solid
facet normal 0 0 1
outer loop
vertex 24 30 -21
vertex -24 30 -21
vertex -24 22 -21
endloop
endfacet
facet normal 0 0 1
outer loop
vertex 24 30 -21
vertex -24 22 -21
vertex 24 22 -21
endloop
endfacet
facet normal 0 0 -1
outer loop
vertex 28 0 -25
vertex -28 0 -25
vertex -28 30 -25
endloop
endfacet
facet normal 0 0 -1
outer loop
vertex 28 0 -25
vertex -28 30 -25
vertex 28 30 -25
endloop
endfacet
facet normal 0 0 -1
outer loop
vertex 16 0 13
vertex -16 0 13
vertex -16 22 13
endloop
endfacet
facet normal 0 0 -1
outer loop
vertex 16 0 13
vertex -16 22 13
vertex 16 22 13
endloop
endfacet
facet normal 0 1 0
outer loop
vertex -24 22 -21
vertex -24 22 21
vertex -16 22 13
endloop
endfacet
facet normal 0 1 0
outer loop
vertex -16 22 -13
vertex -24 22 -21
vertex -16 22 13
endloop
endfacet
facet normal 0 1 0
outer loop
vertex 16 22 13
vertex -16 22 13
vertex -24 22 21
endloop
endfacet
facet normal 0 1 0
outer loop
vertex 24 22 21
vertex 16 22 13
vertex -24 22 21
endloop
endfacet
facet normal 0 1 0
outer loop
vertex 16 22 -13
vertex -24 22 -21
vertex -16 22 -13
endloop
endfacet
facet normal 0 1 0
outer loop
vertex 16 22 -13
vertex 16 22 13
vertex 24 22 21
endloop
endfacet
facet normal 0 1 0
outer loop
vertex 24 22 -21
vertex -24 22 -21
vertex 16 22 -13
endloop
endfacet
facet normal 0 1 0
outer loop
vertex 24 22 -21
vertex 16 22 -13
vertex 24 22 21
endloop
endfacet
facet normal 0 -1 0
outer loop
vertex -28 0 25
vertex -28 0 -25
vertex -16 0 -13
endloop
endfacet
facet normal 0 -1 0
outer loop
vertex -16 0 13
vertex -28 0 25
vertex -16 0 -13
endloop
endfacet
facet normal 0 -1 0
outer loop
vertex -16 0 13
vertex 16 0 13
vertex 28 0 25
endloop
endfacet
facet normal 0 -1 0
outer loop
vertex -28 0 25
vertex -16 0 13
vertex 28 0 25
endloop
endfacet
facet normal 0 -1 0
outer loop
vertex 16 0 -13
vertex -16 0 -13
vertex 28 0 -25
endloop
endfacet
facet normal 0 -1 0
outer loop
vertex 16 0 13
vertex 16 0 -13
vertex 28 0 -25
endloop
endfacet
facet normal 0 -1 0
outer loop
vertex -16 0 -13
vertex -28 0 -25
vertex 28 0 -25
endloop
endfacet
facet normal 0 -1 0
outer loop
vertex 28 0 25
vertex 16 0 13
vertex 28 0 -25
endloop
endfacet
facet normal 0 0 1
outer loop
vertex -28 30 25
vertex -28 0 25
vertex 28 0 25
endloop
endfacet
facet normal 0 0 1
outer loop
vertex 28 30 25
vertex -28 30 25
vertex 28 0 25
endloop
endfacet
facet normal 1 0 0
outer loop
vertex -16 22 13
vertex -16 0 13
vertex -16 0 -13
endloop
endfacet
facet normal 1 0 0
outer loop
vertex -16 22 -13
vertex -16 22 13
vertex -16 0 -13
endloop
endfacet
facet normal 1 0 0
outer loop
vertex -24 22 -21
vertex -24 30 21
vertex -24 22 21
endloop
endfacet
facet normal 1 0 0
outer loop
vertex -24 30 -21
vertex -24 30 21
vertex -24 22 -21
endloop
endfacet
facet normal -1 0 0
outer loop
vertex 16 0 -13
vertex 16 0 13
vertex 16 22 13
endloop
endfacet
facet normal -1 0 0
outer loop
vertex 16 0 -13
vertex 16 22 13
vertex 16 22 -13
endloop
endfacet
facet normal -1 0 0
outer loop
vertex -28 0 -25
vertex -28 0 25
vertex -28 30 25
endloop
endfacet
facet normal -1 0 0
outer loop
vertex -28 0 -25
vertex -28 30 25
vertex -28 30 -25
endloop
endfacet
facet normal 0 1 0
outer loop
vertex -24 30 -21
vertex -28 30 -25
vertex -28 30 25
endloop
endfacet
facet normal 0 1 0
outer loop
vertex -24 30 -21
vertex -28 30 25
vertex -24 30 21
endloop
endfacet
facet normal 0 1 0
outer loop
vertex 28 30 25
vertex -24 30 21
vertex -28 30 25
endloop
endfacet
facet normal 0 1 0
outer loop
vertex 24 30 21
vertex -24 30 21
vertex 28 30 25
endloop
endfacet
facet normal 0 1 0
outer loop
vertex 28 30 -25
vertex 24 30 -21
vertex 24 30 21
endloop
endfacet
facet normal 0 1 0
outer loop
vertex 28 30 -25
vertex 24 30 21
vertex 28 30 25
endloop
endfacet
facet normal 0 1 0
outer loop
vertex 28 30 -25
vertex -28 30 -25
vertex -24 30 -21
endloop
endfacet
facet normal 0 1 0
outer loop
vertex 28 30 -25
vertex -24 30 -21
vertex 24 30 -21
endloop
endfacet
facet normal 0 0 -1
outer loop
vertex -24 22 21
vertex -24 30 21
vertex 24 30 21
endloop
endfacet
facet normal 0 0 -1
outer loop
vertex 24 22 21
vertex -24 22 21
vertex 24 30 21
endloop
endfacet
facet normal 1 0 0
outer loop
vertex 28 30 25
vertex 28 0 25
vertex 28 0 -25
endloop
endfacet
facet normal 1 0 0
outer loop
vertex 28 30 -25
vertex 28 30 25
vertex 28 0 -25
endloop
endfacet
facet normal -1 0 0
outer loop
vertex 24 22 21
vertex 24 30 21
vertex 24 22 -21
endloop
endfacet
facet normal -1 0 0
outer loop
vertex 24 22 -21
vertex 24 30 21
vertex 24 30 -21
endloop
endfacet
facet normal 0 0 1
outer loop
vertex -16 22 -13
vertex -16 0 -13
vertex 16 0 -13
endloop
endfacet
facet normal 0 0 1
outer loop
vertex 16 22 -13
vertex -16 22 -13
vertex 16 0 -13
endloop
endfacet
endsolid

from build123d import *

# Parameters (mm, degrees)
SKETCH1_W               = 56
SKETCH1_H               = 50
BOSS_EXTRUDE1_DEPTH     = 30
SKETCH3_W               = 48
SKETCH3_H               = 42
CUT_EXTRUDE1_DEPTH      = 8
CUT_EXTRUDE2_DEPTH      = 44.508619836
CUT_EXTRUDE2_DEPTH_BACK = 44.508619836
SKETCH5_W               = 32
SKETCH5_H               = 26


with BuildPart() as part:
    # Sketch1 → Boss-Extrude1 (new body)
    with BuildSketch(Plane(origin=(0, 0, 0), x_dir=(1, 0, 0), z_dir=(0, 1, 0))):
        Rectangle(SKETCH1_W, SKETCH1_H)
    extrude(amount=BOSS_EXTRUDE1_DEPTH)

    # Sketch3 → Cut-Extrude1 (cut)
    with BuildSketch(Plane(origin=(0, 30, 0), x_dir=(1, 0, 0), z_dir=(0, 1, 0))):
        Rectangle(SKETCH3_W, SKETCH3_H)
    extrude(amount=-CUT_EXTRUDE1_DEPTH, mode=Mode.SUBTRACT)

    # Sketch5 → Cut-Extrude2 (cut, two sides: drawn at the far end of the back side and taken through both)
    with BuildSketch(Plane(origin=(0, 22, 0), x_dir=(1, 0, 0), z_dir=(0, 1, 0)).offset(-CUT_EXTRUDE2_DEPTH_BACK)):
        Rectangle(SKETCH5_W, SKETCH5_H)
    extrude(amount=CUT_EXTRUDE2_DEPTH + CUT_EXTRUDE2_DEPTH_BACK, mode=Mode.SUBTRACT)


solid = part.part
